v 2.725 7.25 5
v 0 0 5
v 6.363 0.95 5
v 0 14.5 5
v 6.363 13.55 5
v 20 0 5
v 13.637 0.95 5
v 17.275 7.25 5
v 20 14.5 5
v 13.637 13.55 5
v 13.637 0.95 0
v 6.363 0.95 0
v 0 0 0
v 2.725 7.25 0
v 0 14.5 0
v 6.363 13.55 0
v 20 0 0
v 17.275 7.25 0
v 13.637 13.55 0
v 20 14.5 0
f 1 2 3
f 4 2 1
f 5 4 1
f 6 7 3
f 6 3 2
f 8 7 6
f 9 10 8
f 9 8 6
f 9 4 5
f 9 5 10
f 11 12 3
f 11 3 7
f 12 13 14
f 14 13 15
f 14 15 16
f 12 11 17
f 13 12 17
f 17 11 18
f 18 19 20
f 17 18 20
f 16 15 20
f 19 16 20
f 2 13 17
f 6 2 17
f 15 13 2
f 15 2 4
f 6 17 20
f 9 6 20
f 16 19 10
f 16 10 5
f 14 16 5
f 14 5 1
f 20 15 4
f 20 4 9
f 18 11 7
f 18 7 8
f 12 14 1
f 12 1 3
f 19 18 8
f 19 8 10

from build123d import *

# Parameters (mm, degrees)
ESQUISSE1_W        = 20
ESQUISSE1_H        = 14.5
BOSS_EXTRU_1_DEPTH = 5


with BuildPart() as part:
    # Esquisse1 → Boss.-Extru.1 (new body)
    with BuildSketch(Plane.XY):
        with Locations((10, 7.25)):
            Rectangle(ESQUISSE1_W, ESQUISSE1_H)
        Polygon((17.274613392, 7.25), (13.637306696, 13.55), (6.362693304, 13.55), (2.725386608, 7.25), (6.362693304, 0.95), (13.637306696, 0.95), align=None, mode=Mode.SUBTRACT)
    extrude(amount=BOSS_EXTRU_1_DEPTH)


solid = part.part
